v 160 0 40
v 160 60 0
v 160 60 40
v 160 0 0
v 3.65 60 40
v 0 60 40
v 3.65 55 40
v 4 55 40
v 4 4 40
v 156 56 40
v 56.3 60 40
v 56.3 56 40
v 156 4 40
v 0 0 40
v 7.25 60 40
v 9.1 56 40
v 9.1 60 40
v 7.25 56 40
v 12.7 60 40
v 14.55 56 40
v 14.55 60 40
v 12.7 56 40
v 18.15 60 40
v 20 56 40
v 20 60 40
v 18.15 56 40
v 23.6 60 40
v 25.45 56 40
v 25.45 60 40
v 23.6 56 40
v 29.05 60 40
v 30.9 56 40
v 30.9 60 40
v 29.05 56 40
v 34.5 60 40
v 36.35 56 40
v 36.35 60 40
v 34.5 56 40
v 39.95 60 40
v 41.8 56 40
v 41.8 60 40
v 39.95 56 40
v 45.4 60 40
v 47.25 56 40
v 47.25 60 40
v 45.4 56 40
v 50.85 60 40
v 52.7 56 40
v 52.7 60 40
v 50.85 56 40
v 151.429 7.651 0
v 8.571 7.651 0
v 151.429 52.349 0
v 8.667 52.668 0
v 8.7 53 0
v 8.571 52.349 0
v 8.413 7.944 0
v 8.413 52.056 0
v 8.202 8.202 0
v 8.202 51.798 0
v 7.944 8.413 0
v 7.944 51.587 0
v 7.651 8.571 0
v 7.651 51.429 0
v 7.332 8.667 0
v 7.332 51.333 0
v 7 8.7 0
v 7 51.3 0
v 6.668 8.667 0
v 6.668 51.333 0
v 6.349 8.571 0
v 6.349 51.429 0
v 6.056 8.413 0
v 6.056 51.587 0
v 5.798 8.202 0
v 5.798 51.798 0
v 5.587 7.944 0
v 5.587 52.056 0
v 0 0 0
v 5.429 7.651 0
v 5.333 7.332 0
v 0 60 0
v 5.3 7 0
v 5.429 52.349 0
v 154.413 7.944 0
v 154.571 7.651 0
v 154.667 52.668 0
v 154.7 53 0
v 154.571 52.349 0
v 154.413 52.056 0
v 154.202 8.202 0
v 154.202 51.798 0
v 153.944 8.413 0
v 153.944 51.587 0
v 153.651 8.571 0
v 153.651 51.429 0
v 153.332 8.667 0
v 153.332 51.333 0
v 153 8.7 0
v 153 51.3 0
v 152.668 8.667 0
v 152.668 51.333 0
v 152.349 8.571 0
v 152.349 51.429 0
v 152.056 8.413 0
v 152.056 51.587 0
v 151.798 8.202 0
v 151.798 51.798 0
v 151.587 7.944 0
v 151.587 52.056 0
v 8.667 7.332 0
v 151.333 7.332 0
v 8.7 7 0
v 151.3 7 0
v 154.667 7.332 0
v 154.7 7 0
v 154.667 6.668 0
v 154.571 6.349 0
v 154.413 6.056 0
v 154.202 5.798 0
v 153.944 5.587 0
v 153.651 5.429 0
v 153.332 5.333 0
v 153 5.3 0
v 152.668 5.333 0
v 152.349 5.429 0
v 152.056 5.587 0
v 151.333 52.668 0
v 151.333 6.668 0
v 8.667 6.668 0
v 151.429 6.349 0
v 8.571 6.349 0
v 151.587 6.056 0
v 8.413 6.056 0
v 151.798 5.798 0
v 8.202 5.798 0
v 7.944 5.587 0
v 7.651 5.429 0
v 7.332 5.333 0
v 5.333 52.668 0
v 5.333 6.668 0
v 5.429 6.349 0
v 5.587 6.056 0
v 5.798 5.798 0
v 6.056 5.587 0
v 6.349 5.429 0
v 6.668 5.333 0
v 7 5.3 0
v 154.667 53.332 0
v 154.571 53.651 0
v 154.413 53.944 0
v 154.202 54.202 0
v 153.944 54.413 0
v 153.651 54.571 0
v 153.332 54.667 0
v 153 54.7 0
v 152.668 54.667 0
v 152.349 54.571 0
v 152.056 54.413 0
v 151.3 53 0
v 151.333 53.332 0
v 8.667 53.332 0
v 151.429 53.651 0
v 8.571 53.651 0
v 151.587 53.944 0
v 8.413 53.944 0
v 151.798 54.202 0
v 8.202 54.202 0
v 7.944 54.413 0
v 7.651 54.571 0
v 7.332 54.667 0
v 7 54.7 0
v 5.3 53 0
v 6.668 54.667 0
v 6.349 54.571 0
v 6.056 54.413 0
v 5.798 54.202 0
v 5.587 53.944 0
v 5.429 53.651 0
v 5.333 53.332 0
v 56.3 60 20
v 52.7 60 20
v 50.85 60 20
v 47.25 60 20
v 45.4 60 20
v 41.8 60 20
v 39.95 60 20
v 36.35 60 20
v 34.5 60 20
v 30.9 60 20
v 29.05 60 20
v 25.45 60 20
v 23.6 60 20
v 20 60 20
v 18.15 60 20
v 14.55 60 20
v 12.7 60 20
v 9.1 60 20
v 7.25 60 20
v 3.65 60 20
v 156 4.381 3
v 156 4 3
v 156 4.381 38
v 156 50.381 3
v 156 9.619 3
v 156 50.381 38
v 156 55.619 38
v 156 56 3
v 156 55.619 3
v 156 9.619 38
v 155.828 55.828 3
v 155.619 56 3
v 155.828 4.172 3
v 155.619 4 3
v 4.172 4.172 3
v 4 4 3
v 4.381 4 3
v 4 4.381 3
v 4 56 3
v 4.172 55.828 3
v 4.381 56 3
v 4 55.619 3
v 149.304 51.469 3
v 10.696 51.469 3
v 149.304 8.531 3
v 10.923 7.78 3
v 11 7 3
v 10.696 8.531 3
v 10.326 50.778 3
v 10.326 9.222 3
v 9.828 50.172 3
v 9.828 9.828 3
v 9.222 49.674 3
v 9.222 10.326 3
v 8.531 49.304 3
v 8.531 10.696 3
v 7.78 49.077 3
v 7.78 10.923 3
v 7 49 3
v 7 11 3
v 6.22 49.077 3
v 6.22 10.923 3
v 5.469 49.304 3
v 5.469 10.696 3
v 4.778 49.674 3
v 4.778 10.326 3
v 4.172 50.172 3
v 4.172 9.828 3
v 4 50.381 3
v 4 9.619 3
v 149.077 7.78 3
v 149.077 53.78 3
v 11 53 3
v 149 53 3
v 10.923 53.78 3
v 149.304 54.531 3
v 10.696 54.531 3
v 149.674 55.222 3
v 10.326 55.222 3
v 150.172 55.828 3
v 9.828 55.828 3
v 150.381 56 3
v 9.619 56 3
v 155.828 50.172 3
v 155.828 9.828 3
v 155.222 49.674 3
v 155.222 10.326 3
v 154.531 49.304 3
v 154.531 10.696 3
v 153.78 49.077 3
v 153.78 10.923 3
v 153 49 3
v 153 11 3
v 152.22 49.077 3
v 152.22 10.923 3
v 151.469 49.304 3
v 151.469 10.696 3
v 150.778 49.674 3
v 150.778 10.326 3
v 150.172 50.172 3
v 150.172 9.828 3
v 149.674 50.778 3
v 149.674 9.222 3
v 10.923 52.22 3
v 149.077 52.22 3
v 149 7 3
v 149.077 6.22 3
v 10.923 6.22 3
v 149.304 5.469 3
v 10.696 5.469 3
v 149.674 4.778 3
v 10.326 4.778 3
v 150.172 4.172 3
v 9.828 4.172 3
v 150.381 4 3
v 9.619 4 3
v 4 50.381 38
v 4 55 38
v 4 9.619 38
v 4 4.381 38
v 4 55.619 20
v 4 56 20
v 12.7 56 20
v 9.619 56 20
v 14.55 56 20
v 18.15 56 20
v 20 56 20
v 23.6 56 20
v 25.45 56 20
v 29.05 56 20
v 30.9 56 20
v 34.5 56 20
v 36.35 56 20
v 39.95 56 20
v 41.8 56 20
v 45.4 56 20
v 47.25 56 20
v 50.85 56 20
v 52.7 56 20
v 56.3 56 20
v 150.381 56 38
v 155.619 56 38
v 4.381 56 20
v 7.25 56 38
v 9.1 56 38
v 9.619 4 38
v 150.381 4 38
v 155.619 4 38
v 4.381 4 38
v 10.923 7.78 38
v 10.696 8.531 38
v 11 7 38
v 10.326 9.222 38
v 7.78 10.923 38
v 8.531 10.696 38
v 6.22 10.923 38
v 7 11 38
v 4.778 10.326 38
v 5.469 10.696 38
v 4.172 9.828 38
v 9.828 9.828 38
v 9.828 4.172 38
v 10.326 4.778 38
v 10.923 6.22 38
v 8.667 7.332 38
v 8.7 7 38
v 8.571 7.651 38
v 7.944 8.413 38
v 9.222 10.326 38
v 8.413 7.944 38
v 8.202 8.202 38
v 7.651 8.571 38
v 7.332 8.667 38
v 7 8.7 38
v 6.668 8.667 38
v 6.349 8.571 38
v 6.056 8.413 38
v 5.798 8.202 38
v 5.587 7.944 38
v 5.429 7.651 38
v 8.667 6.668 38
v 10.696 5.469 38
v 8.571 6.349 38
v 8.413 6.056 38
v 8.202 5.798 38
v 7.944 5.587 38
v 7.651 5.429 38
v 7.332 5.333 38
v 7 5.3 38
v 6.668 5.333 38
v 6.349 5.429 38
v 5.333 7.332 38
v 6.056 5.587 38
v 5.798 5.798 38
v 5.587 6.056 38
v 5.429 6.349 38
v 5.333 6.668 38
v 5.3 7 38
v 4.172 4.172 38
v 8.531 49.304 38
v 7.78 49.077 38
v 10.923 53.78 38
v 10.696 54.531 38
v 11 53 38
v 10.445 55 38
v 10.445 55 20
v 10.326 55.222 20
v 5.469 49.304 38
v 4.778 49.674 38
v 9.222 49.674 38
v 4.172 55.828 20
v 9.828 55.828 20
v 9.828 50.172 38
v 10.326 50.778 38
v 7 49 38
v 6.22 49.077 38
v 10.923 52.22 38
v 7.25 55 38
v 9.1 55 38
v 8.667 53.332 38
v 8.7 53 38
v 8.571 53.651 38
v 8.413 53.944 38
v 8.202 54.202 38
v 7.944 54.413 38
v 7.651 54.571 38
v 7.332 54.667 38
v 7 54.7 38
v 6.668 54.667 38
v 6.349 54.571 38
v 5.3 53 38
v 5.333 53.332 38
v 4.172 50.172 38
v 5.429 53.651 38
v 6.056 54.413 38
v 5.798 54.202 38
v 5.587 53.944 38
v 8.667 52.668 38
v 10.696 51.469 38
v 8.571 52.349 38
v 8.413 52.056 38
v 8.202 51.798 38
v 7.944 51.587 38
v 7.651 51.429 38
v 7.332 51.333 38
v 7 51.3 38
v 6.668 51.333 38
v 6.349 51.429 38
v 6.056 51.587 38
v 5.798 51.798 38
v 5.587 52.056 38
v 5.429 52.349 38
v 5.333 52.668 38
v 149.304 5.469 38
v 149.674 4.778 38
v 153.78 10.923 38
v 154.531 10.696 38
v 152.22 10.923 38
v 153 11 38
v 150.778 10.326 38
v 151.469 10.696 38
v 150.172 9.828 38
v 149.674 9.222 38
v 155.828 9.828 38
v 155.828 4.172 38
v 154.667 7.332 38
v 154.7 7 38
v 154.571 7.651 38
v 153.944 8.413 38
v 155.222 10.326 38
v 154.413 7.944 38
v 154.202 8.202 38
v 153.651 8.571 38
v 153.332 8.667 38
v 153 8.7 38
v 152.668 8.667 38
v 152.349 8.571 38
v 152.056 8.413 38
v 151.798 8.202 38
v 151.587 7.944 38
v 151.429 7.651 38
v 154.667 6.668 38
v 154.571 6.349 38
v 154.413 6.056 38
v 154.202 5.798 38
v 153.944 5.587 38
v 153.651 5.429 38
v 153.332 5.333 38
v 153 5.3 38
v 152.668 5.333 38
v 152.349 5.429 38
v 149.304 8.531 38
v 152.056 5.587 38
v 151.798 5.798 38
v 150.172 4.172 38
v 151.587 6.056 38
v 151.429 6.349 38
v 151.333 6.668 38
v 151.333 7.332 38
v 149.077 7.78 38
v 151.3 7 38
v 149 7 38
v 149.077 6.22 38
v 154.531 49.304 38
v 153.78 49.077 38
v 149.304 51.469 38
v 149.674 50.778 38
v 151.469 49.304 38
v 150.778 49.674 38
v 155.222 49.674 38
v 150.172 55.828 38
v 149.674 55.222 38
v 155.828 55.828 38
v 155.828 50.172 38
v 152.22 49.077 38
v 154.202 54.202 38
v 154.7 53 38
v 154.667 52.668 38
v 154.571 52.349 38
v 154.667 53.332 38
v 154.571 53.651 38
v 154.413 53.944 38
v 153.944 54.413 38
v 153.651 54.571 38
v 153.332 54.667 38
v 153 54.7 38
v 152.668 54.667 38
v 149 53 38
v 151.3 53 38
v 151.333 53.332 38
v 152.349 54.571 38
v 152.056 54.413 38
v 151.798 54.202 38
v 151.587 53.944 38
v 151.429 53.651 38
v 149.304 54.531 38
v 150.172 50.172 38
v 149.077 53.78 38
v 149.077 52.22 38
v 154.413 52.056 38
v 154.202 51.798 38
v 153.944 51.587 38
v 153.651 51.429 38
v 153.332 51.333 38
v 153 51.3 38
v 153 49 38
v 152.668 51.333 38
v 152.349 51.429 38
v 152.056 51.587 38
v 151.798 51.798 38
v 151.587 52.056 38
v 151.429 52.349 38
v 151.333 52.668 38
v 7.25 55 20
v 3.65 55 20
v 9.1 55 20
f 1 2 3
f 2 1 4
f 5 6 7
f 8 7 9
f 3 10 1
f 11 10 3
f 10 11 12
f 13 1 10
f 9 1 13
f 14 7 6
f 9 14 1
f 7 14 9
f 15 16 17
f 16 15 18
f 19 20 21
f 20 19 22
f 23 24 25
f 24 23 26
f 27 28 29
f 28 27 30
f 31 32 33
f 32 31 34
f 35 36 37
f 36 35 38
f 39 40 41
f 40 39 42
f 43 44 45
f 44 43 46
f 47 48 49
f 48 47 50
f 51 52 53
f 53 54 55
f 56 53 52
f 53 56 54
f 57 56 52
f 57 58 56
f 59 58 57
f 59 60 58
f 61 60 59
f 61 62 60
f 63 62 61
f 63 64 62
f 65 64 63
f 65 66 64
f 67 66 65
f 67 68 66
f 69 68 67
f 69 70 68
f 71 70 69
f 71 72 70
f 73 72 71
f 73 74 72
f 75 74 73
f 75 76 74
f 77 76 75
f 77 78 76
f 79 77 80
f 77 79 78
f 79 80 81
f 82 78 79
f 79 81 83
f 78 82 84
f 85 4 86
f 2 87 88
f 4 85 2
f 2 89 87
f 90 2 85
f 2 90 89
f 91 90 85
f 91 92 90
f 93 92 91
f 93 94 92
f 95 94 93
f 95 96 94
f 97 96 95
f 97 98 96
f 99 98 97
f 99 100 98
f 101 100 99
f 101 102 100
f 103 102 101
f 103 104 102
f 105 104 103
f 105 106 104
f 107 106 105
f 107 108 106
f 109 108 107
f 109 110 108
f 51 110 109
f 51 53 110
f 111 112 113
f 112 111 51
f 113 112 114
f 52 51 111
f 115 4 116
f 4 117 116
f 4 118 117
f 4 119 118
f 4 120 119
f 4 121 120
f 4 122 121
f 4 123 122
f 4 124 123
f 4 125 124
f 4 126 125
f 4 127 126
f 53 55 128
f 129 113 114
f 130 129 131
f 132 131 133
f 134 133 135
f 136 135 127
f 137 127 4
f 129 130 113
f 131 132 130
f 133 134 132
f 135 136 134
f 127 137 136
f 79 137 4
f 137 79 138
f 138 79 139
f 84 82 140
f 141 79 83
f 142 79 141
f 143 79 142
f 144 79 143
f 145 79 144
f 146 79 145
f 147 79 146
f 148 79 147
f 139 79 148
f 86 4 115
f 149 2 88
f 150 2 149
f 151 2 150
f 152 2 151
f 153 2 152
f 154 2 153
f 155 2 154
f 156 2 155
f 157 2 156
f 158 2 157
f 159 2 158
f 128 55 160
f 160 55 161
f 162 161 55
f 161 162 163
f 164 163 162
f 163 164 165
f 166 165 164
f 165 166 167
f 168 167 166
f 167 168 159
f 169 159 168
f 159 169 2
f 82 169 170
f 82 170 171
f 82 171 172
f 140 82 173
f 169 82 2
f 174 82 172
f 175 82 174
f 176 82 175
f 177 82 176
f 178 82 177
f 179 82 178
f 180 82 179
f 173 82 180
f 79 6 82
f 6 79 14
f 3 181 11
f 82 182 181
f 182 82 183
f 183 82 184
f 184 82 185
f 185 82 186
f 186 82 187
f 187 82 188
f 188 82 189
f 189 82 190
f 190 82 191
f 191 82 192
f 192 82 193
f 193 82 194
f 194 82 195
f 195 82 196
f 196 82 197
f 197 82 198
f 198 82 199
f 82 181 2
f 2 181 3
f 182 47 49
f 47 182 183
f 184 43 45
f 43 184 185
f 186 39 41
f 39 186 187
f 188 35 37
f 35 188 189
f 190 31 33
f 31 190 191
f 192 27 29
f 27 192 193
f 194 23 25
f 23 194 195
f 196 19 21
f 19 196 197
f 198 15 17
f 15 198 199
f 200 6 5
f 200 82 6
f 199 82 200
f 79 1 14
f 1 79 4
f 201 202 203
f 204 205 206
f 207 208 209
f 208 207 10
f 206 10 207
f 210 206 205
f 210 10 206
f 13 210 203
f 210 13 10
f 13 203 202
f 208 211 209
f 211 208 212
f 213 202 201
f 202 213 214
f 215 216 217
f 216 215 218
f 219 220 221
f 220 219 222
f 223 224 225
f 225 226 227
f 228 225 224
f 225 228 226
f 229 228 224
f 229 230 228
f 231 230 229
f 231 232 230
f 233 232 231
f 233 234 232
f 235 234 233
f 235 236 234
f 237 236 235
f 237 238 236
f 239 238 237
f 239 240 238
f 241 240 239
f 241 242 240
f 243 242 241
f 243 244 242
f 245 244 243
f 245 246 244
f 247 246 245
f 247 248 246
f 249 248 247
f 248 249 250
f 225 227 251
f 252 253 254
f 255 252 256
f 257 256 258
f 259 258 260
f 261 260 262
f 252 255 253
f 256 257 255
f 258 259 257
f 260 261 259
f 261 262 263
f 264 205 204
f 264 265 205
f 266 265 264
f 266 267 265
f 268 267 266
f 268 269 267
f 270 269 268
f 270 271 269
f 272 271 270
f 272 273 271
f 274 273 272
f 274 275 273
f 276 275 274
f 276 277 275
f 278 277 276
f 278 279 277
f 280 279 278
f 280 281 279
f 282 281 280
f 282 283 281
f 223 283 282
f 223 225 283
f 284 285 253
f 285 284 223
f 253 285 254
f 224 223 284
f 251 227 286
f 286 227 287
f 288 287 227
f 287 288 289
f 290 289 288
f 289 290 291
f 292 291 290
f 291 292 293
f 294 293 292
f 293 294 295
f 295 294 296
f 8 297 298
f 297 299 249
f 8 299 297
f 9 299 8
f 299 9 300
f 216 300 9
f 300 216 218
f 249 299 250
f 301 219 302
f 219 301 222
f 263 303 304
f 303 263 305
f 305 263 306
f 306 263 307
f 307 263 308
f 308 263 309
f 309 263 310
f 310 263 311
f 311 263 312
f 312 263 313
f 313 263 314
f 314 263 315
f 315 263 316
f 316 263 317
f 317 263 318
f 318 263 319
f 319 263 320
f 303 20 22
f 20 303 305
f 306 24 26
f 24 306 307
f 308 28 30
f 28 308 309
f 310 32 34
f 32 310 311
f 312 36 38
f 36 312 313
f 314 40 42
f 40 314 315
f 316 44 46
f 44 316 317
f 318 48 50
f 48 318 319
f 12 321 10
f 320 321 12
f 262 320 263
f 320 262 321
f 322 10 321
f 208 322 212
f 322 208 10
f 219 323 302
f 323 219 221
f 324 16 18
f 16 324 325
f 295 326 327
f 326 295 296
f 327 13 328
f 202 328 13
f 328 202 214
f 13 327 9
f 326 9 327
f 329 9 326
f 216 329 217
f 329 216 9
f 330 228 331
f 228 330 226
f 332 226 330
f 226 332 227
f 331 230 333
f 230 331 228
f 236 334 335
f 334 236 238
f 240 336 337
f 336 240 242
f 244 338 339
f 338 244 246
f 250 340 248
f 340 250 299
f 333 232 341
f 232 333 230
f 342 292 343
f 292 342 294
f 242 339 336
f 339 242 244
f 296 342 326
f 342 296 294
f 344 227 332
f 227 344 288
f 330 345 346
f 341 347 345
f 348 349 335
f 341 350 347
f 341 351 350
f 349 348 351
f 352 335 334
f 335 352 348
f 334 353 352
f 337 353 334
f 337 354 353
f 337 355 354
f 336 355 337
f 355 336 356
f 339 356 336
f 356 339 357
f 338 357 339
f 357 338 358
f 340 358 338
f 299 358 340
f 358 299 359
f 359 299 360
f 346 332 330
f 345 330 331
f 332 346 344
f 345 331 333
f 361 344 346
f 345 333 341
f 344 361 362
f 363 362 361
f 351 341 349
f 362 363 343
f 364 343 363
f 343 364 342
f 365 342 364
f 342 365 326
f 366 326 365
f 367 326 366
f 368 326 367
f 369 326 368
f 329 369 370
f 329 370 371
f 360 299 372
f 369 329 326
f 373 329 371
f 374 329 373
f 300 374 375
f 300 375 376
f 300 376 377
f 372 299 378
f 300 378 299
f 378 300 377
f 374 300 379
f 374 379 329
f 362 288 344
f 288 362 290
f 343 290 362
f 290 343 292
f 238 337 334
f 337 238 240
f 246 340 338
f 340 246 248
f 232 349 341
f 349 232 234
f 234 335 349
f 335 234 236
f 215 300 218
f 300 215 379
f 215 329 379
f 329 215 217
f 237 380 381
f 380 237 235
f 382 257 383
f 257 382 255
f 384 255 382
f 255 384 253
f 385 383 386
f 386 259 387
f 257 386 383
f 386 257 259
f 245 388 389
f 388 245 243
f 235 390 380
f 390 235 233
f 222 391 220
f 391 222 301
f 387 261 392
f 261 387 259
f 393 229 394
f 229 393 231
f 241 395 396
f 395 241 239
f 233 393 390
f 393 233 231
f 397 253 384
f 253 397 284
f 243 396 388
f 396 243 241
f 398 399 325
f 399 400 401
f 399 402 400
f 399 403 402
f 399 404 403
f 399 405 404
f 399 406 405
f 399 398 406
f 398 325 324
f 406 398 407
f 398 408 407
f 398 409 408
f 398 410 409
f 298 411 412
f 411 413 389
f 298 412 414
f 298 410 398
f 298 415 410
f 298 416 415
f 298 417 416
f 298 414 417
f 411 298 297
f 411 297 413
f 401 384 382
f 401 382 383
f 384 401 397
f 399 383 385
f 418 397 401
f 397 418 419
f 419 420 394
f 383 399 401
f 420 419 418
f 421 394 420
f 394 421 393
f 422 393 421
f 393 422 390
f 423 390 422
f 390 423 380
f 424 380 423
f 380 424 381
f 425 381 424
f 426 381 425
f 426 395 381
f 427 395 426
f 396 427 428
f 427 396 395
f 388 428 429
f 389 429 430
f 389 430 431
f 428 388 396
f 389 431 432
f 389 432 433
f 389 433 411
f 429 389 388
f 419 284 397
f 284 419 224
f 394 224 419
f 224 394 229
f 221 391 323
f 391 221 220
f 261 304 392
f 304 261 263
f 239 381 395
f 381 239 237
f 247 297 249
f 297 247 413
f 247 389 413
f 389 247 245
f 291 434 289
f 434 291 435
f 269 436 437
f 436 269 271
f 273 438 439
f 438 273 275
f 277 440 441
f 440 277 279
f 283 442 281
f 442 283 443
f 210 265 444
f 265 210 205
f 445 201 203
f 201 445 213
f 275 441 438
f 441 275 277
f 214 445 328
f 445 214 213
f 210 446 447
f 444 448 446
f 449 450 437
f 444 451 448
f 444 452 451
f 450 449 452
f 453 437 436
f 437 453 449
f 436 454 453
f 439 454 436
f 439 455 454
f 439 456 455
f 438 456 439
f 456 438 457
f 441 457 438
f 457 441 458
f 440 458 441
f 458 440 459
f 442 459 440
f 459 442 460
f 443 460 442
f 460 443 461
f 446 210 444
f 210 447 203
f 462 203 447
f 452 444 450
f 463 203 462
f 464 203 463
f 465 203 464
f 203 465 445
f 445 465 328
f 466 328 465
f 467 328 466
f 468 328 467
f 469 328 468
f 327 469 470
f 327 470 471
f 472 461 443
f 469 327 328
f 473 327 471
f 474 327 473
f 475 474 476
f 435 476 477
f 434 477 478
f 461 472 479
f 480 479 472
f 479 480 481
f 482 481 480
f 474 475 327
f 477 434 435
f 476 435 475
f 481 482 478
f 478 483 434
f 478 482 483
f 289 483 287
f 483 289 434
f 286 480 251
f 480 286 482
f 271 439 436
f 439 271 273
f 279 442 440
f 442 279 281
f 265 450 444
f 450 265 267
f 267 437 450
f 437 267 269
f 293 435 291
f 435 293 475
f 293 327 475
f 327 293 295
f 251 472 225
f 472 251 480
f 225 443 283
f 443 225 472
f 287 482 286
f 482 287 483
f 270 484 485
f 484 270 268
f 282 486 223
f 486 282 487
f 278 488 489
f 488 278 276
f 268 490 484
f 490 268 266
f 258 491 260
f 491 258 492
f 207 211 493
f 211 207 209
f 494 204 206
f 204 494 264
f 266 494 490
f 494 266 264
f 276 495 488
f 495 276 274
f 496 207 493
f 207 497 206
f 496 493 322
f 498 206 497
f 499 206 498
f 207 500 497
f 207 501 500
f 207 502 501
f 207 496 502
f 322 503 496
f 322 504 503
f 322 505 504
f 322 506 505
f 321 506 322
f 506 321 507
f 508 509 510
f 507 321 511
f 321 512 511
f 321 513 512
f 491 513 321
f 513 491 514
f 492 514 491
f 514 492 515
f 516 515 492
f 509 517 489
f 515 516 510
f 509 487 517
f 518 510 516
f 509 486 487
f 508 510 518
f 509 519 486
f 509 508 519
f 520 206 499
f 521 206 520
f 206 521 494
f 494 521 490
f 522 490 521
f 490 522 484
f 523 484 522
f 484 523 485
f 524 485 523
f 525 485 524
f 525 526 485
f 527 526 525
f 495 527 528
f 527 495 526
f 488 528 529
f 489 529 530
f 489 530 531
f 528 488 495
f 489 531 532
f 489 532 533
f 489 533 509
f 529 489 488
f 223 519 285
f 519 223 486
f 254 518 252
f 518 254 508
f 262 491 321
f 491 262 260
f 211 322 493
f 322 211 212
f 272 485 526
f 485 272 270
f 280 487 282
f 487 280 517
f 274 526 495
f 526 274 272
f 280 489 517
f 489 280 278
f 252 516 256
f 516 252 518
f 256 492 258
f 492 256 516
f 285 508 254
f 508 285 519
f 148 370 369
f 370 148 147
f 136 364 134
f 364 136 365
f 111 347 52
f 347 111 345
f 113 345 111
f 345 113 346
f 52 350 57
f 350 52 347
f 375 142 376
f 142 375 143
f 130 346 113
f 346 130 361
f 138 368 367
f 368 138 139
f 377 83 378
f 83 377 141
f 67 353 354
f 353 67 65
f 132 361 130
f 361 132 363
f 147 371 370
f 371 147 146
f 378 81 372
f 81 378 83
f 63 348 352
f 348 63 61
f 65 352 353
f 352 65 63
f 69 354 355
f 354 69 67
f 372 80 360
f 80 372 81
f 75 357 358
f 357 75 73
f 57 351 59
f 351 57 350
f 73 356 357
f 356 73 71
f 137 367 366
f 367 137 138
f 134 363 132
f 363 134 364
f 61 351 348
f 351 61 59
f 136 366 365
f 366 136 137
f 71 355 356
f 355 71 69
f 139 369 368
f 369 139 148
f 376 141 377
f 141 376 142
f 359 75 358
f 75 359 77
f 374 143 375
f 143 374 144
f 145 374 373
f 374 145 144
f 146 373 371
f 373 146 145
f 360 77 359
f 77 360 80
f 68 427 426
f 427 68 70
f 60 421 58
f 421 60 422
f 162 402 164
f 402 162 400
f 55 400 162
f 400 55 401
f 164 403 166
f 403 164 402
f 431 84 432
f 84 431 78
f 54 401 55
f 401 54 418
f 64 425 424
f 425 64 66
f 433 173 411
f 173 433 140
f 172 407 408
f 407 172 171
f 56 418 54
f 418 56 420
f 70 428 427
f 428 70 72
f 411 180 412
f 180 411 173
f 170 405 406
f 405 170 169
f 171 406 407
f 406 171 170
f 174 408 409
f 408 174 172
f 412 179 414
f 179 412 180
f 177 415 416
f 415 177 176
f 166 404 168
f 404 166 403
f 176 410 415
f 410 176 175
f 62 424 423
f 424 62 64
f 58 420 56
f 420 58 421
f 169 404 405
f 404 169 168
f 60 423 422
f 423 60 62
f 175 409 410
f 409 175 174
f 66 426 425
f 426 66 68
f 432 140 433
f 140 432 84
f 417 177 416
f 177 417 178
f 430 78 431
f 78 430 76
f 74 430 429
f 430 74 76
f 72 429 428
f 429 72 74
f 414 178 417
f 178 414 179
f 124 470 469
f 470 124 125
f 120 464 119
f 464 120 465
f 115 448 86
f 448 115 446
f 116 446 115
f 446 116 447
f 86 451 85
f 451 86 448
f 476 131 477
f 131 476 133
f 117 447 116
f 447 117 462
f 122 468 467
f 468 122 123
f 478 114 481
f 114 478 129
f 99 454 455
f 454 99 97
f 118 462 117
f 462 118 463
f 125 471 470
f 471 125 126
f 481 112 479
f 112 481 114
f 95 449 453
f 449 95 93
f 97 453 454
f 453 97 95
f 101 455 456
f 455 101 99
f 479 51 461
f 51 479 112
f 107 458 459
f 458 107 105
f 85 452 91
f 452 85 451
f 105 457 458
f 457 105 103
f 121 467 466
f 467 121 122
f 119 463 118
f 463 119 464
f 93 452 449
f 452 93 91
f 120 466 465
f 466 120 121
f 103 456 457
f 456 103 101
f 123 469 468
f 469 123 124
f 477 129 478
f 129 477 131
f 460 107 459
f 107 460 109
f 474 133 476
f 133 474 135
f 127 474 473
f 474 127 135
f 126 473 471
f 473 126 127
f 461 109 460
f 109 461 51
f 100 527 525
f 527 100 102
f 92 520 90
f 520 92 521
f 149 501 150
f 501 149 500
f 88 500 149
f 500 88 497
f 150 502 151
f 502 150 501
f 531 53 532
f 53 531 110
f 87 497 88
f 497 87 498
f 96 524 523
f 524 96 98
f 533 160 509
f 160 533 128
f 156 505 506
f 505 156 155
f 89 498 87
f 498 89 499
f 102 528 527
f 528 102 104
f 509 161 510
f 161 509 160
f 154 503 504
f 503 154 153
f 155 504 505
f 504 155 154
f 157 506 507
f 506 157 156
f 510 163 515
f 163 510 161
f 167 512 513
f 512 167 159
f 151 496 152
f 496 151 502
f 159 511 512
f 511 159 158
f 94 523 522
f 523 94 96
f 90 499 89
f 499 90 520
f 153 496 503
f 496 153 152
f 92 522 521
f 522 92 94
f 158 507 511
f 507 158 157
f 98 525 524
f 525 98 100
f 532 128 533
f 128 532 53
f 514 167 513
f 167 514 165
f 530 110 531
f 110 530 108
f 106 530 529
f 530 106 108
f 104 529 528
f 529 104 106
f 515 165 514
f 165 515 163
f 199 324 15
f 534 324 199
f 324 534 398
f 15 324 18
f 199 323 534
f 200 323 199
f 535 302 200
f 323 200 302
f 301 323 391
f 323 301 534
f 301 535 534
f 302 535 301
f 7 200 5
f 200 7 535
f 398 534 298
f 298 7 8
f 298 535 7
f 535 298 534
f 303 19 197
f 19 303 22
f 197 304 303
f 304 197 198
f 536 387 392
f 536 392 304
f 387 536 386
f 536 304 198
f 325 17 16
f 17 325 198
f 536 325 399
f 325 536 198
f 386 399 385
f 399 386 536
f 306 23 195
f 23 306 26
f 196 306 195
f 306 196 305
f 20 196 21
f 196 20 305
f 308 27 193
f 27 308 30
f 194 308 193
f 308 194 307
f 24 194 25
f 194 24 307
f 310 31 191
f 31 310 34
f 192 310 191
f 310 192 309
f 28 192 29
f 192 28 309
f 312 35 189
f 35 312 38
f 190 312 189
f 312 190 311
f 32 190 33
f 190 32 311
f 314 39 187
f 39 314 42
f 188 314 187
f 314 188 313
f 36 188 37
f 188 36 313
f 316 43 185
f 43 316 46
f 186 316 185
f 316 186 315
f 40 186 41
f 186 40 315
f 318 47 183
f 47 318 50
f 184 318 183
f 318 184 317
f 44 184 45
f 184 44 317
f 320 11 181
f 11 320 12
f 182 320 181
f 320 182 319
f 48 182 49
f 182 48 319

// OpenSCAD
$fn = 32;

// ----------------------------------------------------------------------
// Enclosure body: 160 x 60 x 40 mm, wall 4 mm
// ----------------------------------------------------------------------

// --- parameters (mm) ---
length = 160;             // outside length, X
width = 60;               // outside width, Y
height = 40;              // outside height, Z
wall = 4;                 // side wall thickness
floor_t = 3;              // floor thickness
boss_d = 8;               // corner boss diameter
boss_h = 35;              // corner boss height above the floor
boss_hole_d = 3.4;        // lid screw clearance in the boss
boss_lip = 7;             // boss centre inset from the corner
vent_slots = 10;          // vent slots in the long wall
vent_w = 3.6;             // vent slot width
vent_h = 25;              // vent slot height
vent_pitch = 5.45;        // vent slot pitch
vent_z = 20;              // vent slot sill height

module shell() {
  difference() {
    cube([length, width, height]);
    /* hollow, open at the top */
    translate([wall, wall, floor_t])
      cube([length - 2 * wall, width - 2 * wall, height]);
  }
}

module bosses() {
  /* corner bosses, sunk 1 mm into the floor */
  for (sx = [0, 1]) for (sy = [0, 1])
    translate([sx * (length - 2 * boss_lip) + boss_lip, sy * (width - 2 * boss_lip) + boss_lip, floor_t - 1])
      cylinder(h = boss_h + 1, d = boss_d);
}

difference() {
  union() {
    shell();
    bosses();
  }
  /* boss screw holes */
  for (sx = [0, 1]) for (sy = [0, 1])
    translate([sx * (length - 2 * boss_lip) + boss_lip, sy * (width - 2 * boss_lip) + boss_lip, -1]) cylinder(h = floor_t + boss_h + 2, d = boss_hole_d);
  /* vent grille in the +Y wall */
  for (i = [0 : vent_slots - 1]) translate([vent_pitch * (i + 1) - vent_w / 2, width - wall - 1, vent_z]) cube([vent_w, wall + 2, vent_h]);
}
